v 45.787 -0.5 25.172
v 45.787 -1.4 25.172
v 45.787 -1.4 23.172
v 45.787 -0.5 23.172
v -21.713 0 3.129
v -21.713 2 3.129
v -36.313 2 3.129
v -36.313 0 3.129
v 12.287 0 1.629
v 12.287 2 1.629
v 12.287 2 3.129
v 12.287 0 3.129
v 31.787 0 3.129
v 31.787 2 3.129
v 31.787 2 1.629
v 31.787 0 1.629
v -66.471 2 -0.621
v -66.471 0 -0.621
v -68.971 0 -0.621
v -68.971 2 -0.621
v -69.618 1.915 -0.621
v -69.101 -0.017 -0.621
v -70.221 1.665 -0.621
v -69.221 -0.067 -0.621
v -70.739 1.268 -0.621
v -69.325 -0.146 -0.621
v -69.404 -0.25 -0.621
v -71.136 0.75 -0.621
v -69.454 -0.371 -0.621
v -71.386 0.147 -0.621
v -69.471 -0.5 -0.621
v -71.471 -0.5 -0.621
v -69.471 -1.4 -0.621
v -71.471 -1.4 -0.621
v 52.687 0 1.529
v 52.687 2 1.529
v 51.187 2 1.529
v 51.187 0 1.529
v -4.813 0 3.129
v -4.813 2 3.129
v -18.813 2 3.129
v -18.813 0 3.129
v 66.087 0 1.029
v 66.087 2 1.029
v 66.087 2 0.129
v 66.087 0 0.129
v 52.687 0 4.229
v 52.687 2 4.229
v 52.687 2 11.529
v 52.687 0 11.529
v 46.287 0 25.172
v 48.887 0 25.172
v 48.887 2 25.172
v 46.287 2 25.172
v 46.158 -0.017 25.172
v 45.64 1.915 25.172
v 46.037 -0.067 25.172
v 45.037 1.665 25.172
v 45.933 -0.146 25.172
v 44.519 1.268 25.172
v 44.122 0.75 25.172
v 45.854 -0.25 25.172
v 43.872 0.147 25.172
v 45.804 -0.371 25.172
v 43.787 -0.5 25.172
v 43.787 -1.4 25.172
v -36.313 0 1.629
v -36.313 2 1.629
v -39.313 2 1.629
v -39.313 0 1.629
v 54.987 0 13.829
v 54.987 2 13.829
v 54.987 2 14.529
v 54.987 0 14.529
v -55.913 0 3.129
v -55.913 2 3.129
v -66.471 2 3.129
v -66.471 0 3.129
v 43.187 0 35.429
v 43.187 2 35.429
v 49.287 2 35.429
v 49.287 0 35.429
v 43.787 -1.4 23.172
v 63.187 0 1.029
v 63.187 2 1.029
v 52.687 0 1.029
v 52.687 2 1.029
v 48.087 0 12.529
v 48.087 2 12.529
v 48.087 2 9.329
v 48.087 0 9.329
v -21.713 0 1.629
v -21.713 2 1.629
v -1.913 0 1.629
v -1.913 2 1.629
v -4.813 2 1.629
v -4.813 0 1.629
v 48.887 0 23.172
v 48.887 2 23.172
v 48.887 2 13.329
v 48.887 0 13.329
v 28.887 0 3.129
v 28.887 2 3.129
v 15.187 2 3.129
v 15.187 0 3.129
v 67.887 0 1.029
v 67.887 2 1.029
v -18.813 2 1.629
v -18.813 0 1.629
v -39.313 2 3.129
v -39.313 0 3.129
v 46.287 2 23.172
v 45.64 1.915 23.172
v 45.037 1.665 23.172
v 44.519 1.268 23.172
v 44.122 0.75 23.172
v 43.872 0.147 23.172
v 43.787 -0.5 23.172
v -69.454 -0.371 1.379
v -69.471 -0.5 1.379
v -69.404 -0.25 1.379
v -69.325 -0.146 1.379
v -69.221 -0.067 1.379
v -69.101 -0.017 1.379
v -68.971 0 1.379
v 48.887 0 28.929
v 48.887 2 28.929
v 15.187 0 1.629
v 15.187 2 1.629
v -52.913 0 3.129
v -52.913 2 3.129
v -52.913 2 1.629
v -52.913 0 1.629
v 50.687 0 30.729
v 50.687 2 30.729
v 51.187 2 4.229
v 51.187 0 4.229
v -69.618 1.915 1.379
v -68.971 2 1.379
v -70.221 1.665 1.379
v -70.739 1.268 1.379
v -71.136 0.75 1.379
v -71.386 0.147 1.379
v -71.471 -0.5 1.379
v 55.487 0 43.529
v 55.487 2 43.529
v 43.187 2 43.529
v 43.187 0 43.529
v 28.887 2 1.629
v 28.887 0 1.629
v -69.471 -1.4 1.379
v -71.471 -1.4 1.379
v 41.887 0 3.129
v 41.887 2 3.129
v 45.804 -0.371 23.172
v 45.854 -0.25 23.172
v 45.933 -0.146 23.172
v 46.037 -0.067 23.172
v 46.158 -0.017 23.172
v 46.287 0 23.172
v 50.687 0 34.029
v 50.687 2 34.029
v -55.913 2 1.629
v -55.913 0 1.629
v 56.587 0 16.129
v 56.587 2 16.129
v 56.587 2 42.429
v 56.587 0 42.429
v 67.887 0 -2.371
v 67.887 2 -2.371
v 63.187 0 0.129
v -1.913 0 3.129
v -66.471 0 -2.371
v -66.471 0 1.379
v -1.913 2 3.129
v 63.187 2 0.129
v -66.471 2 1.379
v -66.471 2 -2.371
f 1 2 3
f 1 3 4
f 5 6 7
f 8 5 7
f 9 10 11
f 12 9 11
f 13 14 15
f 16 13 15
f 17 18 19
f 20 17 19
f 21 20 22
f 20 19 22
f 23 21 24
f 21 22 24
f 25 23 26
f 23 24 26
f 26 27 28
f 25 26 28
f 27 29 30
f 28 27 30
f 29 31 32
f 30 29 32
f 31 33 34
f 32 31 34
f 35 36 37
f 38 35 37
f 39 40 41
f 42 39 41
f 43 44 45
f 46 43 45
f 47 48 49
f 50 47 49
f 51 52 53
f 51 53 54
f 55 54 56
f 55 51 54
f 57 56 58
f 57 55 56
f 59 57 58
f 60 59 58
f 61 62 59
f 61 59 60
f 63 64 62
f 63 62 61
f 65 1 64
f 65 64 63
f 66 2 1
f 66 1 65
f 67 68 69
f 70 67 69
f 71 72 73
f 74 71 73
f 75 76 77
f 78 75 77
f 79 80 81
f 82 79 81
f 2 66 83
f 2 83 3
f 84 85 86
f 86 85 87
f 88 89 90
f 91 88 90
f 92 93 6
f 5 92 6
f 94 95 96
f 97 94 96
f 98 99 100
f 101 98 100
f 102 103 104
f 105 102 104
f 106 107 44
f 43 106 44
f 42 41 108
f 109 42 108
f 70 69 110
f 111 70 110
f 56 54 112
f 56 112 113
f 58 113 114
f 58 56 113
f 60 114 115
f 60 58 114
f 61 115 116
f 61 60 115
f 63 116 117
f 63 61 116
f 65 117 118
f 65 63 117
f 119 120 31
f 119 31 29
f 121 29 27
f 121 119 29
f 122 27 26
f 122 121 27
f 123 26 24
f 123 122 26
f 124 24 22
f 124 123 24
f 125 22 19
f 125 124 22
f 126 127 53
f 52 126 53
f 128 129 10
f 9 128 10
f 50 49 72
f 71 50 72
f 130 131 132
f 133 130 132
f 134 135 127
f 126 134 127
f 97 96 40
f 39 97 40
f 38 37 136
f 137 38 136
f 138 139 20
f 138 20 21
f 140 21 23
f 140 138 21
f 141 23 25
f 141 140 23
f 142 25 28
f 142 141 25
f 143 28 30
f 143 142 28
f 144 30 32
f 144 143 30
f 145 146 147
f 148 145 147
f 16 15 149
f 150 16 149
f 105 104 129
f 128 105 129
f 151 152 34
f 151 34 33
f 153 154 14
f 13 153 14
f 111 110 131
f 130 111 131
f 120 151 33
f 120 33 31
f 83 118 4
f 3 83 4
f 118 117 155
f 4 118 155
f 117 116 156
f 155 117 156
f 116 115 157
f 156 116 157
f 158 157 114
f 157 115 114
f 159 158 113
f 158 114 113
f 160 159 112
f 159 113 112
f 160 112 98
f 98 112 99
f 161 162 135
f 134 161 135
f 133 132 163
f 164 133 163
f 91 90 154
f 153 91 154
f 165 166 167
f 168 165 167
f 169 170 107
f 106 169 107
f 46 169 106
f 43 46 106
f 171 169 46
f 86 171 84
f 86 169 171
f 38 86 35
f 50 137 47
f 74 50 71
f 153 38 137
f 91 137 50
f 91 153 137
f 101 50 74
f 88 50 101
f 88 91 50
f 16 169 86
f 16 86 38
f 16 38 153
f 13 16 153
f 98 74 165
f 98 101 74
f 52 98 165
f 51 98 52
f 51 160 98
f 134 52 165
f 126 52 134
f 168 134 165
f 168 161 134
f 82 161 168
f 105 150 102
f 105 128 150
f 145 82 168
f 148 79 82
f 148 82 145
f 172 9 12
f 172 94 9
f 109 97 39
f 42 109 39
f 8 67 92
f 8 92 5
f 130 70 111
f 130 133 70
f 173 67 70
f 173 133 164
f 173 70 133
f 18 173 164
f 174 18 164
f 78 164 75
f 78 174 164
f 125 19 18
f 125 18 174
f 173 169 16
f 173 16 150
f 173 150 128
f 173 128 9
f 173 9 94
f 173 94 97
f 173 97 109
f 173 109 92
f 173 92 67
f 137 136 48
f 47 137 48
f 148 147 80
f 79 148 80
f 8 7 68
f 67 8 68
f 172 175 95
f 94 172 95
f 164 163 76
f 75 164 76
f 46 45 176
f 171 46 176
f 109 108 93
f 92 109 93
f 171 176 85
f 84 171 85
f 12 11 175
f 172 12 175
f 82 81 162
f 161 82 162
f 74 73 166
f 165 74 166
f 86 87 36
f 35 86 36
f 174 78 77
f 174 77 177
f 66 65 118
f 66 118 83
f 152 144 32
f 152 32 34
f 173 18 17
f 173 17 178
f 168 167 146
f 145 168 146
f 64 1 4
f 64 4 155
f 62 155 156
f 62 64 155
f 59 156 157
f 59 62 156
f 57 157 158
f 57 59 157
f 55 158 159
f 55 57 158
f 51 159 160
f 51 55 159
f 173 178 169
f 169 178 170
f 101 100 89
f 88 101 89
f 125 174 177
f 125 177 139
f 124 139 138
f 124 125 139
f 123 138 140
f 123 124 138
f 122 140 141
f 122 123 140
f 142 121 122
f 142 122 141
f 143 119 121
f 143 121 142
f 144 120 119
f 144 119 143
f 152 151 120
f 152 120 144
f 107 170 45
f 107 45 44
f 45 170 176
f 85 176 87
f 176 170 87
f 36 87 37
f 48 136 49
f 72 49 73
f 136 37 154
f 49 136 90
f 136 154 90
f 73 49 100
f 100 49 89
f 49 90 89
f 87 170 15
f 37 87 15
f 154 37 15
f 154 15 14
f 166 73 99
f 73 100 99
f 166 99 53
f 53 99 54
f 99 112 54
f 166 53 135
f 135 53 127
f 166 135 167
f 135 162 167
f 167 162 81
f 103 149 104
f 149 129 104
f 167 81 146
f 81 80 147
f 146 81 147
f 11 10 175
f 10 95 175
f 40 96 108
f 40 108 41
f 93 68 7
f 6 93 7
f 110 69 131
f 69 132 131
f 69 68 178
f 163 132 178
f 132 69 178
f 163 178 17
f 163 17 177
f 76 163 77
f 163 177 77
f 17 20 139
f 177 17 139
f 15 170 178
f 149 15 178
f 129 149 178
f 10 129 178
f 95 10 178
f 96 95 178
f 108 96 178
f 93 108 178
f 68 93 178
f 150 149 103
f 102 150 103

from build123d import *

# Parameters (mm, degrees)
BOSS_EXTRUDE1_DEPTH     = 2
EDGE_FLANGE1_DEPTH      = 2
EDGE_FLANGE1_BEND_DEPTH = 2
MOVE_FACE1_BY           = 5
CUT_EXTRUDE1_DEPTH      = 10


# Sheet-metal steps are written as plain solids
with BuildPart() as part:
    # Sketch1 → Boss-Extrude1 (new body)
    with BuildSketch(Plane(origin=(0, 0, 0), x_dir=(1, 0, 0), z_dir=(0, 1, 0))):
        Polygon((48.786990623, -23.171897133), (48.786990623, -13.328634875), (47.986992223, -12.528636475), (47.986992223, -9.428635055), (41.786991923, -3.228634755), (-54.913007717, -3.228634755), (-66.471417942, -3.228634755), (-66.471417942, -1.378635375), (-68.471417942, -1.378635375), (-68.471417942, 0.621364625), (-66.471417942, 0.621364625), (-66.471417942, 2.471364005), (-54.913007717, 2.471364005), (65.786992183, 2.471364005), (65.786992183, -1.128636415), (52.786992783, -1.128636415), (52.786992783, -11.528635935), (54.986990923, -13.728634075), (54.986993463, -14.428635215), (56.686992603, -16.128634355), (56.686992603, -42.528634895), (53.786993323, -45.428634175), (43.086991863, -45.428634175), (43.086991863, -34.028634115), (49.286992163, -34.028634115), (50.586992103, -32.728634175), (50.586992103, -30.828635435), (48.786990623, -29.028636495), (48.786990623, -25.171897133), (46.786990623, -25.171897133), (46.786990623, -23.171897133), align=None)
    extrude(amount=BOSS_EXTRUDE1_DEPTH)

    # Edge-Flange1 section (across the edge) → Edge-Flange1 (add)
    with BuildSketch(Plane(origin=(-69.471417942, 0, 1.378635375), x_dir=(1, 0, 0), z_dir=(0, 0, -1))):
        with BuildLine():
            Line((-2, 0.5), (-2, 1.4))
            Line((-2, 1.4), (0, 1.4))
            Line((0, 1.4), (0, 0.5))
            ThreePointArc((0, 0.5), (0.146446609, 0.146446609), (0.5, 0))
            Line((0.5, 0), (1, 0))
            Line((1, 0), (1, -2))
            Line((1, -2), (0.5, -2))
            ThreePointArc((0.5, -2), (-1.267766953, -1.267766953), (-2, 0.5))
        make_face()
    extrude(amount=EDGE_FLANGE1_DEPTH)

    # Edge-Flange1 section 2 (across the edge) → Edge-Flange1 bend (add)
    with BuildSketch(Plane(origin=(45.786990623, 0, 25.171897133), x_dir=(1, 0, 0), z_dir=(0, 0, -1))):
        with BuildLine():
            Line((-2, 0.5), (-2, 1.4))
            Line((-2, 1.4), (0, 1.4))
            Line((0, 1.4), (0, 0.5))
            ThreePointArc((0, 0.5), (0.146446609, 0.146446609), (0.5, 0))
            Line((0.5, 0), (1, 0))
            Line((1, 0), (1, -2))
            Line((1, -2), (0.5, -2))
            ThreePointArc((0.5, -2), (-1.267766953, -1.267766953), (-2, 0.5))
        make_face()
    extrude(amount=EDGE_FLANGE1_BEND_DEPTH)

    # Move Face1: a face moved outward by 5.0
    extrude(part.faces().sort_by_distance((65.786992183, 1, -0.671363795))[0], amount=MOVE_FACE1_BY, dir=(1, 0, 0))

    # Sketch12 → Cut-Extrude1 (cut)
    with BuildSketch(Plane(origin=(0, 2, 0), x_dir=(1, 0, 0), z_dir=(0, 1, 0))):
        Polygon((-52.913012042, -1.628639718), (-55.913012042, -1.628639718), (-55.913012042, -3.128639258), (-67.564249917, -3.128639258), (-67.671952829, -4.327104706), (41.886988858, -5.326407077), (48.086989158, -13.828640718), (48.007739716, -22.517187069), (46.286990623, -23.171897133), (48.886987558, -23.171897133), (48.886987558, -13.328639178), (48.086989158, -12.528640778), (48.086989158, -9.328639558), (41.886988858, -3.128639258), (31.786988738, -3.128639258), (31.786988738, -1.628639718), (28.886989458, -1.628639718), (28.886989458, -3.128639258), (15.186988918, -3.128639258), (15.186988918, -1.628639718), (12.286989638, -1.628639718), (12.286989638, -3.128639258), (-1.913012442, -3.128639258), (-1.913012442, -1.628639718), (-4.813011722, -1.628639718), (-4.813011722, -3.128639258), (-18.813011662, -3.128639258), (-18.813011662, -1.628639718), (-21.713010942, -1.628639718), (-21.713010942, -3.128639258), (-36.313012222, -3.128639258), (-36.313012222, -1.628639718), (-39.313011302, -1.628639718), (-39.313011302, -3.128639258), (-52.913012042, -3.128639258), align=None)
        Polygon((48.886987558, -25.171897133), (46.286990623, -25.171897133), (41.570815933, -34.028638418), (41.570815933, -47.167587605), (56.254650903, -46.954291818), (57.278434149, -42.02008581), (58.126913923, -16.761088184), (54.30540669, -8.580570975), (54.30540669, -2.3223377), (71.613193797, -2.589733287), (71.946410025, 3.760976012), (44.354427072, 3.760976012), (-68.474759816, 3.760976012), (-68.386329283, 2.371359902), (67.886988718, 2.371359902), (67.886988718, -1.028638378), (66.086988718, -1.028638378), (66.086988718, -0.128640178), (63.186989438, -0.128640178), (63.186989438, -1.028638378), (52.686987578, -1.028638378), (52.686987578, -1.528639918), (51.186988038, -1.528639918), (51.186988038, -4.228639598), (52.686987578, -4.228639598), (52.686987578, -11.528640238), (54.986988058, -13.828640718), (54.986988058, -14.528639318), (56.586989938, -16.128641198), (56.586989938, -42.428636858), (55.486987058, -43.528639738), (43.186988798, -43.528639738), (43.186988798, -35.428640698), (49.286986758, -35.428640698), (50.686989038, -34.028638418), (50.686989038, -30.728637398), (48.886987558, -28.928638458), align=None)
    extrude(amount=-CUT_EXTRUDE1_DEPTH, mode=Mode.SUBTRACT)


solid = part.part
